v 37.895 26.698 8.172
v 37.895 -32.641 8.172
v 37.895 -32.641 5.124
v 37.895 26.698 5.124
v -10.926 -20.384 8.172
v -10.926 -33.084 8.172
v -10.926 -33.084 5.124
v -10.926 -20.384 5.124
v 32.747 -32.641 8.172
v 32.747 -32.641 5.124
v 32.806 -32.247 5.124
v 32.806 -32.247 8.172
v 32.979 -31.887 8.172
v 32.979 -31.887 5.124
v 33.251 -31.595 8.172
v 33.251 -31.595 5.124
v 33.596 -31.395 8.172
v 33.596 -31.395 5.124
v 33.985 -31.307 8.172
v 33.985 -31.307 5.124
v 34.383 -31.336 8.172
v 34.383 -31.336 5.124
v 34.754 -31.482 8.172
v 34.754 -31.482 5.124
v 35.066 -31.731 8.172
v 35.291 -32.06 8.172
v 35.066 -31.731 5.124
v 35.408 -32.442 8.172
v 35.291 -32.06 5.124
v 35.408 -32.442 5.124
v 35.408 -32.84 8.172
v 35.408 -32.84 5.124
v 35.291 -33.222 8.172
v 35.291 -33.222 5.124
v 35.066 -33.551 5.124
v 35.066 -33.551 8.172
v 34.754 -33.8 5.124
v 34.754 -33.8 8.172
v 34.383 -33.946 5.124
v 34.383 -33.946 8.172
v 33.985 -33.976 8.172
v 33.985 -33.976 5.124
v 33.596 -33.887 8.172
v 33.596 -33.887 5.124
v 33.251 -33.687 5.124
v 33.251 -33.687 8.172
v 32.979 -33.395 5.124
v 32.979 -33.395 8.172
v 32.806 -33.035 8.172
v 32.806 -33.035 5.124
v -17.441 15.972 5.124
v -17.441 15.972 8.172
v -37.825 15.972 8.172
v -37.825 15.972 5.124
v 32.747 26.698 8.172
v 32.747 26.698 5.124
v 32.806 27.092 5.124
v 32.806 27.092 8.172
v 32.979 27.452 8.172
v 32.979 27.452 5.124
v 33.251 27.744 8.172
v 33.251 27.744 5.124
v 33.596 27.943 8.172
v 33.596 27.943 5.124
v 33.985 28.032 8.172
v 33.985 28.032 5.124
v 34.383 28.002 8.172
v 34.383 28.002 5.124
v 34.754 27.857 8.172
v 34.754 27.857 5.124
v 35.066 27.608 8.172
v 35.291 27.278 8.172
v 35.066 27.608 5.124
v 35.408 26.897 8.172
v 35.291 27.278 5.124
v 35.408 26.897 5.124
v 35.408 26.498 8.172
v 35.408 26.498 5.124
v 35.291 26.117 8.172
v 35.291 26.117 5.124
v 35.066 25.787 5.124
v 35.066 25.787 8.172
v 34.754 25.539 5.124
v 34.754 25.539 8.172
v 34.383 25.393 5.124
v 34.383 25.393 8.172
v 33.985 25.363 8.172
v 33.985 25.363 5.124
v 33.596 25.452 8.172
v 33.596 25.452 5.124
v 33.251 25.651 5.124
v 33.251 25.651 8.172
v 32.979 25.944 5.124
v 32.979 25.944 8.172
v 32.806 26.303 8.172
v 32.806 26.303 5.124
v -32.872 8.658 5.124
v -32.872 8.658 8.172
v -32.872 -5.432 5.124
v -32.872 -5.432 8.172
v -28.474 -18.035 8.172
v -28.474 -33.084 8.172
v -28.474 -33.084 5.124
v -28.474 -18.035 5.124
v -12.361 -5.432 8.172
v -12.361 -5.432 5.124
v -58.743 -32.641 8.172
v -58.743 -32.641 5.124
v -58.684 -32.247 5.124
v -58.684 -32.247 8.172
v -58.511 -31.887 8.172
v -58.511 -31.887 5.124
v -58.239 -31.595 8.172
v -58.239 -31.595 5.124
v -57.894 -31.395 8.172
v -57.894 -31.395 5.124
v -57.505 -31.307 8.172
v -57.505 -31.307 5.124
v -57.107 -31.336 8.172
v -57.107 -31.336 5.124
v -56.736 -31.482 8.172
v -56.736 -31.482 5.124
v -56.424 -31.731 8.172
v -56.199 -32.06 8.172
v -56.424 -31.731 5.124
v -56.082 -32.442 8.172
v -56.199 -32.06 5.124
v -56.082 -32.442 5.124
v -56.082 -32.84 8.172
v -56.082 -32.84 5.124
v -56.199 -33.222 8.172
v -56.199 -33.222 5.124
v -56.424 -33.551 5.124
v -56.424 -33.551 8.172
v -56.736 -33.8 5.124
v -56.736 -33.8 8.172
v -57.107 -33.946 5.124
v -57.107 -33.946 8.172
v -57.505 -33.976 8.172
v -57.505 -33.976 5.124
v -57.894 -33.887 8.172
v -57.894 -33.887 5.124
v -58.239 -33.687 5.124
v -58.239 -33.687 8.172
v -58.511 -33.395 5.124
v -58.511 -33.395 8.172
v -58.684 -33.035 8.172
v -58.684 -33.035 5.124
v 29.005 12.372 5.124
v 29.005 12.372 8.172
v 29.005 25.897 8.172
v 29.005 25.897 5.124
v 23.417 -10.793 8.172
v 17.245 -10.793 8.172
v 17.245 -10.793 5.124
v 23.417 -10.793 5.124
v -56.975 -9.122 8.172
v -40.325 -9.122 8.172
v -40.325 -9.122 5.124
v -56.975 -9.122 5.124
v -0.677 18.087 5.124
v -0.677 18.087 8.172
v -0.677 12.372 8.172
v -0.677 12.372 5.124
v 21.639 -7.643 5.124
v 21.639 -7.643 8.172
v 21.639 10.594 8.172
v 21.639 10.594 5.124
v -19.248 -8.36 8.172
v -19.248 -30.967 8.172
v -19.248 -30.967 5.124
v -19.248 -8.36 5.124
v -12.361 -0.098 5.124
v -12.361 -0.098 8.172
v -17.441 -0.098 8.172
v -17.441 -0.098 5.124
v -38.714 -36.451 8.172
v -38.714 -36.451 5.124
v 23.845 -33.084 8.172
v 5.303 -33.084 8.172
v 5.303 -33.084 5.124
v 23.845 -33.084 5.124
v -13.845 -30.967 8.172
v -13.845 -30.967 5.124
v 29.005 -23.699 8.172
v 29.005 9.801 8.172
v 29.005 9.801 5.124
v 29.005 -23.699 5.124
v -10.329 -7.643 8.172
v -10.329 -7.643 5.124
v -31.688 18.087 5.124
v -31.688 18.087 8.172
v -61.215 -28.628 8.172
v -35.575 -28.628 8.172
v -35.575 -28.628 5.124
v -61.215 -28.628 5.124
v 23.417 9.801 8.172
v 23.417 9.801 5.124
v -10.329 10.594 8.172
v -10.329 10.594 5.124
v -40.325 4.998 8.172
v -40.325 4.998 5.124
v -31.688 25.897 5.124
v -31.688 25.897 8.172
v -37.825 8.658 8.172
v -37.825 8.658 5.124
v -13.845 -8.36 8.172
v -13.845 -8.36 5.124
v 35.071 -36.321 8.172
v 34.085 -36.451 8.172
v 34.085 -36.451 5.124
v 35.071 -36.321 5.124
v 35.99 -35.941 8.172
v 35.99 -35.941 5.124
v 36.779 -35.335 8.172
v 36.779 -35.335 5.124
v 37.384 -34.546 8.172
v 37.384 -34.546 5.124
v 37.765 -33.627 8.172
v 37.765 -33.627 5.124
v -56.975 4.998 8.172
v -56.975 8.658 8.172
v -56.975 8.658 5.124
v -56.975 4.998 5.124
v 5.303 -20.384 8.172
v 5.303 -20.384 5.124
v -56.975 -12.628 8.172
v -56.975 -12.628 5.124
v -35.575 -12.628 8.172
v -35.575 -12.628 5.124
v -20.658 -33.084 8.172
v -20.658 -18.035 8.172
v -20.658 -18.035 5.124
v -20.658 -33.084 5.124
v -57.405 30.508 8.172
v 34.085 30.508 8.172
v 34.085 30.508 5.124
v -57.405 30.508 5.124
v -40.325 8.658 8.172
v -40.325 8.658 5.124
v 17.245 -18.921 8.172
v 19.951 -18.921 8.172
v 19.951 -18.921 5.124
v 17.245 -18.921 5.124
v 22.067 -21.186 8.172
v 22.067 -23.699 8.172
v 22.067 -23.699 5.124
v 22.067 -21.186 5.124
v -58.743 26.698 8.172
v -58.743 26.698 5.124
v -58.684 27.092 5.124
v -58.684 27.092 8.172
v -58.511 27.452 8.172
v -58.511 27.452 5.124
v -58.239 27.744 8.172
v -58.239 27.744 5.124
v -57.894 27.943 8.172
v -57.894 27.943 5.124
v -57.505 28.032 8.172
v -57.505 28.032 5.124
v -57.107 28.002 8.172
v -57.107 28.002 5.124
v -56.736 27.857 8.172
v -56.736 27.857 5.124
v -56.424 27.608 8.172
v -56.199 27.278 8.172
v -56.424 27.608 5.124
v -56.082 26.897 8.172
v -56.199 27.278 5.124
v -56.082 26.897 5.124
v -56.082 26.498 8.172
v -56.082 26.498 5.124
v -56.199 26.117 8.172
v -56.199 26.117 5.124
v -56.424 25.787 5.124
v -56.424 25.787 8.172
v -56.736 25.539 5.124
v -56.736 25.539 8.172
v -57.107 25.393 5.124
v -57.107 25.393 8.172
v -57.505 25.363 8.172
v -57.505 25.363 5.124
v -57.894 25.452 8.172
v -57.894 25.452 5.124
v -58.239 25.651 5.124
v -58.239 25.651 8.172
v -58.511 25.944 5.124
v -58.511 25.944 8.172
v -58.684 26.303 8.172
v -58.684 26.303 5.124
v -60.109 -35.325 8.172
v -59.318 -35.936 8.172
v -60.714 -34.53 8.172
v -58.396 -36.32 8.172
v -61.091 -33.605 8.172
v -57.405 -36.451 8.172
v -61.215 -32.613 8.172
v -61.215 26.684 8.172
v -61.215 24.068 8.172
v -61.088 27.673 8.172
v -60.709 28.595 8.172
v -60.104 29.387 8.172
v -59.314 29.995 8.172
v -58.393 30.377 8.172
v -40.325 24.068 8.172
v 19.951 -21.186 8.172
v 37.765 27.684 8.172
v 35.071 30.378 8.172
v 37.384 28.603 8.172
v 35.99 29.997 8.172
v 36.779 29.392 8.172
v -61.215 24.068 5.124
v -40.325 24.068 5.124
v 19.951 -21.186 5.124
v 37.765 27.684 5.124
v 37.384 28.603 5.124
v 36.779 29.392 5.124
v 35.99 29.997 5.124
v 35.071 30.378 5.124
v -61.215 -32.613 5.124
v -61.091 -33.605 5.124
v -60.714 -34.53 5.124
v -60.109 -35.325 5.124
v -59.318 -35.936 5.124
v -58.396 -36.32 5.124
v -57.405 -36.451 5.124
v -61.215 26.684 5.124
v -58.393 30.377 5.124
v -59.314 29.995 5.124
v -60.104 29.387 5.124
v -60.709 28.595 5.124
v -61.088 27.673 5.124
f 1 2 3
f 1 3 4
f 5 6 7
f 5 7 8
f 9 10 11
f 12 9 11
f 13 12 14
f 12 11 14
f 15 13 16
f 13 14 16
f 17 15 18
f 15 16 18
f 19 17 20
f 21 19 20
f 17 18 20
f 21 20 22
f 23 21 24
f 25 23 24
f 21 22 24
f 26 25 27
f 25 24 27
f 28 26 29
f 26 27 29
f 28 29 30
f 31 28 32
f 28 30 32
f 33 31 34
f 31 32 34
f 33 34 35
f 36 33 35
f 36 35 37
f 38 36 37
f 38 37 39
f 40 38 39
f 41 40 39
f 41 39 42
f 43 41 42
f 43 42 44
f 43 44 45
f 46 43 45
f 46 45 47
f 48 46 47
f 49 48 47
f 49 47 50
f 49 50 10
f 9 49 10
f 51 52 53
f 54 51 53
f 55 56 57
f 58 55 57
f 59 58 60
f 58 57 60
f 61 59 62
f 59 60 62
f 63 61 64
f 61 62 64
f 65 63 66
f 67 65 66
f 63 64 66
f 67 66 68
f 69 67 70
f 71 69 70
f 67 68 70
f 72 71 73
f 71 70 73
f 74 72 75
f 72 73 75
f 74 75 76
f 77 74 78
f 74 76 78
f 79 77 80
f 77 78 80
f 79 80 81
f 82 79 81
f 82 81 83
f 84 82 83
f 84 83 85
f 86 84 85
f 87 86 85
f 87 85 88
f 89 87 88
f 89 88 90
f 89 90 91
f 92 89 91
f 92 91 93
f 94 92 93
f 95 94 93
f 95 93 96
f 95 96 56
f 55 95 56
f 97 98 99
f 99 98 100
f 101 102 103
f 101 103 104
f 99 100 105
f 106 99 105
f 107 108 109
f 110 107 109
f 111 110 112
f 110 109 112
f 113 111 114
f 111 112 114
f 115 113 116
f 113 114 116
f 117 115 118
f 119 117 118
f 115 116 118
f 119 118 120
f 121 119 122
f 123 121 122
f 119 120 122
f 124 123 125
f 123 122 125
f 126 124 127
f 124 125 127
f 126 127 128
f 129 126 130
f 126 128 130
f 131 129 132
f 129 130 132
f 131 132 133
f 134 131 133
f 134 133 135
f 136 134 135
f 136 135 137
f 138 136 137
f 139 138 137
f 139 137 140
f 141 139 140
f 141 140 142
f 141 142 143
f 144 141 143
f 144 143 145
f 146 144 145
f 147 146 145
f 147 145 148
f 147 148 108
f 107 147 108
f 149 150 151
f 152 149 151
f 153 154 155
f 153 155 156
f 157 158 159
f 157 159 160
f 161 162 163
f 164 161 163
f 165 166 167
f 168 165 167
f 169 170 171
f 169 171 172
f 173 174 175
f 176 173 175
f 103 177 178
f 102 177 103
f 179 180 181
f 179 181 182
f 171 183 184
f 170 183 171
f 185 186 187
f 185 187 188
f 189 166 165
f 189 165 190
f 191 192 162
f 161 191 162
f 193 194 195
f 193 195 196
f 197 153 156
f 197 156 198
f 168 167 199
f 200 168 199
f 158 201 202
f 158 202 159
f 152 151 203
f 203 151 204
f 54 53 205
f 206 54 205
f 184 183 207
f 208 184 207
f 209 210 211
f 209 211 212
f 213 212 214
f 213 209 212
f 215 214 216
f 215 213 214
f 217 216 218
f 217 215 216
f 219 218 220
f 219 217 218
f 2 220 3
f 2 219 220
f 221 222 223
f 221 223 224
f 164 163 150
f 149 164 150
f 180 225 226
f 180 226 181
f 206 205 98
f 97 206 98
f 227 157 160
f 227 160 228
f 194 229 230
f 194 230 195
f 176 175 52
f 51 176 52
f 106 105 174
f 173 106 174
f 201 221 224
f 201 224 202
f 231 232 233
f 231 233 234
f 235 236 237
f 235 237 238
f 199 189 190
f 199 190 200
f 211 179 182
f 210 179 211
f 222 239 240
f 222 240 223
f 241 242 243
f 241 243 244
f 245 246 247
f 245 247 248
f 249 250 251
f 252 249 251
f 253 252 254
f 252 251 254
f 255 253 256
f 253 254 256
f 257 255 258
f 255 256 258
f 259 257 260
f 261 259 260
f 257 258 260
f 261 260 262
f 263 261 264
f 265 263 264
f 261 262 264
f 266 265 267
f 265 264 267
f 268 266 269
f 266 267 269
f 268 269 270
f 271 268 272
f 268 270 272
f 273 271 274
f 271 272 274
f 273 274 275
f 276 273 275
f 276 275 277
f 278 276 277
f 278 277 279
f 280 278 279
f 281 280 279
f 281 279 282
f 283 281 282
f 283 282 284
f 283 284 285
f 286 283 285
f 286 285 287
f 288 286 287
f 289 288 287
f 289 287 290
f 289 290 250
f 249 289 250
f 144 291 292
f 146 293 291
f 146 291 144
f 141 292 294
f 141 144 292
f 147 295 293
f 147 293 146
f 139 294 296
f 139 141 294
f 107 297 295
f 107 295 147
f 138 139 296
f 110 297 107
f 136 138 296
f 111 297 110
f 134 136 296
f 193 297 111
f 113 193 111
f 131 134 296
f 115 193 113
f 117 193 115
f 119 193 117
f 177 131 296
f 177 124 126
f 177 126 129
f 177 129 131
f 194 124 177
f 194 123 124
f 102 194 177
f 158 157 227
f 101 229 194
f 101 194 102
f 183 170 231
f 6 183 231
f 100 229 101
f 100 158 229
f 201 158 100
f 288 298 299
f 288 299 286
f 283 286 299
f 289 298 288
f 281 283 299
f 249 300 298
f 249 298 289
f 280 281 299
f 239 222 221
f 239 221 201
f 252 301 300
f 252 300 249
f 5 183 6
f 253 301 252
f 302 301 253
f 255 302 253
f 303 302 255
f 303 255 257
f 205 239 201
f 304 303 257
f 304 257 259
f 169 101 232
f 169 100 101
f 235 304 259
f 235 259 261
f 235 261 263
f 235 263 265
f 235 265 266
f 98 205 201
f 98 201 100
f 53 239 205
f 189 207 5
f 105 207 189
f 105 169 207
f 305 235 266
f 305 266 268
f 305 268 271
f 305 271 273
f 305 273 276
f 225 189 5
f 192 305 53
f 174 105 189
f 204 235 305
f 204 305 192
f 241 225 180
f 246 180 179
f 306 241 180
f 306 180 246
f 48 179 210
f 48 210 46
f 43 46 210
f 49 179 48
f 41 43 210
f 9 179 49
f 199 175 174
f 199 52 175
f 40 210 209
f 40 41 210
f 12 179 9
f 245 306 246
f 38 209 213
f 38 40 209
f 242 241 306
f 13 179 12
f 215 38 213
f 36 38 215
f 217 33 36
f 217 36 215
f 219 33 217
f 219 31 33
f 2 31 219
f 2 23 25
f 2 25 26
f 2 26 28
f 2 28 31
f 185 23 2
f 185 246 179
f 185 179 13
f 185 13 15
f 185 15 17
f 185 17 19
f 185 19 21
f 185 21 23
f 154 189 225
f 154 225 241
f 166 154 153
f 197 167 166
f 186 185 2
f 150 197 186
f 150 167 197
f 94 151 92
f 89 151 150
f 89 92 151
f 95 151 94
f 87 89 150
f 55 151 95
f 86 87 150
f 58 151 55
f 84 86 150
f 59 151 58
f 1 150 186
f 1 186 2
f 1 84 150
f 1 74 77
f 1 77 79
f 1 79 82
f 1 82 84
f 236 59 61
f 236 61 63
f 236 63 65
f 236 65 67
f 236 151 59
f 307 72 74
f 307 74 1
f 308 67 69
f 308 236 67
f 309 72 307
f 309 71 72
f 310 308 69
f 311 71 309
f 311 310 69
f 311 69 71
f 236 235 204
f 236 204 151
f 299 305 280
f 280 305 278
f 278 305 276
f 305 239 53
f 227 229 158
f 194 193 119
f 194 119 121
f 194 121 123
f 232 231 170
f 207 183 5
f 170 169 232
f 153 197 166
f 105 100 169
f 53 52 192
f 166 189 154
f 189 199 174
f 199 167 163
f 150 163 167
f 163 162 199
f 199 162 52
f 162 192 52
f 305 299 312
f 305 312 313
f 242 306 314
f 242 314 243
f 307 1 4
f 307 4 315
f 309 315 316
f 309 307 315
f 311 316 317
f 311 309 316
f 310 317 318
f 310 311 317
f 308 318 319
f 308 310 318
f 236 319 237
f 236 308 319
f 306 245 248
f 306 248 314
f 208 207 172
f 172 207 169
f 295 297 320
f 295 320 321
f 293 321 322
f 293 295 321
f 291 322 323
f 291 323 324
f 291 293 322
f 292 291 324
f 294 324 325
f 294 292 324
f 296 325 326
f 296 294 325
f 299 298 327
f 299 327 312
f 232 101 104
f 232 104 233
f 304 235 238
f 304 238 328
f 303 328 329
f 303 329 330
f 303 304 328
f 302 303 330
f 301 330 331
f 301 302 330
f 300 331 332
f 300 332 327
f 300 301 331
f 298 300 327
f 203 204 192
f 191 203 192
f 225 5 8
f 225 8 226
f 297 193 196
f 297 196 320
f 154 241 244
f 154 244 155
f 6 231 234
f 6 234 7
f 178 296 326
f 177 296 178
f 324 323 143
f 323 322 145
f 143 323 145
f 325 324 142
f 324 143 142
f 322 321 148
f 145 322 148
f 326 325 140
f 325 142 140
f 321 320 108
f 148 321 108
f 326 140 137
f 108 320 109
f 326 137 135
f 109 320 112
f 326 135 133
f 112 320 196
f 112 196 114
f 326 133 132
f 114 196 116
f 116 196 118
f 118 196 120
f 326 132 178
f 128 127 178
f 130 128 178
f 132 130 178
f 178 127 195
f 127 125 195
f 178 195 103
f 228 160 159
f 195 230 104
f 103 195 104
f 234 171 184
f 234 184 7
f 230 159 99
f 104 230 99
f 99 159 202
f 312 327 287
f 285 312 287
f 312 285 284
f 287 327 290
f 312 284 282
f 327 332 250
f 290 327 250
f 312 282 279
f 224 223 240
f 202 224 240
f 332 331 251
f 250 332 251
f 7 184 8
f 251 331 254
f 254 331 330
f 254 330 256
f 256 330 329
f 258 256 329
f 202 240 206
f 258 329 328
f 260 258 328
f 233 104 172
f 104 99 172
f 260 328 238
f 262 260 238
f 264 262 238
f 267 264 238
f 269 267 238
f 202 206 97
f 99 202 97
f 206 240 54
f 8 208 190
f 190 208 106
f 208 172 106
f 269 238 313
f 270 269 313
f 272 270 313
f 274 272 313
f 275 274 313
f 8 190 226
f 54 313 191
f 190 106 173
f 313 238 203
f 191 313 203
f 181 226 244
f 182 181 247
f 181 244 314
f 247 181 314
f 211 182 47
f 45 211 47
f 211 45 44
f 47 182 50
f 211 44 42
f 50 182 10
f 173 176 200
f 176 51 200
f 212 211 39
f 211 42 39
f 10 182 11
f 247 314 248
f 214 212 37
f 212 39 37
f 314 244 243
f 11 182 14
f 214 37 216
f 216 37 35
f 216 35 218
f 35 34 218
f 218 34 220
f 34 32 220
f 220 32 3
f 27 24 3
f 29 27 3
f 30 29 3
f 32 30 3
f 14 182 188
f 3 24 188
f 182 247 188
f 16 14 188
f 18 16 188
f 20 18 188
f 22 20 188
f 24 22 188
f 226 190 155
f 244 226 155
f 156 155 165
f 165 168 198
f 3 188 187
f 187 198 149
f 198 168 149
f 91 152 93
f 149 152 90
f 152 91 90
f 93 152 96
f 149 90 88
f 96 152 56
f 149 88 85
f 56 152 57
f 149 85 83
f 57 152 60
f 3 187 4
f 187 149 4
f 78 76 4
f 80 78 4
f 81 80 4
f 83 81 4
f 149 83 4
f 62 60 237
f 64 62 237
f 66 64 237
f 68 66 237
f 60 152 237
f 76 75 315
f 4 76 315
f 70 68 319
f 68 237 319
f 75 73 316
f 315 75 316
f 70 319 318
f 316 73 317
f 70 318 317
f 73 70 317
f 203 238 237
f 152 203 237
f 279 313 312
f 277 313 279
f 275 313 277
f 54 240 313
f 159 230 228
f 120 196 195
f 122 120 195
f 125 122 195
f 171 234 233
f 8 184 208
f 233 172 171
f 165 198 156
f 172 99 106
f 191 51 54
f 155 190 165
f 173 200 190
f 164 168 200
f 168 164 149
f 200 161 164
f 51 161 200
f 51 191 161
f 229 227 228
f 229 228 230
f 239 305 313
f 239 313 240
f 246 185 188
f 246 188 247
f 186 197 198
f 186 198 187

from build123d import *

# Parameters (mm, degrees)
SKETCH2_W           = 5.4034
SKETCH2_H           = 22.6066
SKETCH2_W_2         = 31.9679
SKETCH2_H_2         = 18.2371
BOSS_EXTRUDE1_DEPTH = 3.048
SKETCH3_R           = 1.338245378
CUT_EXTRUDE1_DEPTH  = 72.310891511


with BuildPart() as part:
    # Sketch2 → Boss-Extrude1 (new body)
    with BuildSketch(Plane(origin=(0, 0, 8.171752382), x_dir=(-1, 0, 0), z_dir=(0, 0, -1))):
        with BuildLine():
            Line((-23.844892625, -33.084405696), (-34.084892625, -36.451005696))
            ThreePointArc((-34.084892625, -36.451005696), (-36.778969461, -35.335082532), (-37.894892625, -32.641005696))
            Line((-37.894892625, -32.641005696), (-37.894892625, 26.697694304))
            ThreePointArc((-37.894892625, 26.697694304), (-36.778969461, 29.391771141), (-34.084892625, 30.507694304))
            Line((-34.084892625, 30.507694304), (57.404932375, 30.507694304))
            ThreePointArc((57.404932375, 30.507694304), (60.103884597, 29.386886916), (61.214907375, 26.683892153))
            Line((61.214907375, 26.683892153), (61.214907375, 24.068294304))
            Line((61.214907375, 24.068294304), (40.325007375, 24.068294304))
            Line((40.325007375, 24.068294304), (40.325007375, 8.658194304))
            Line((40.325007375, 8.658194304), (56.975007375, 8.658194304))
            Line((56.975007375, 8.658194304), (56.975007375, 4.997894304))
            Line((56.975007375, 4.997894304), (40.325007375, 4.997894304))
            Line((40.325007375, 4.997894304), (40.325007375, -9.121805696))
            Line((40.325007375, -9.121805696), (56.975007375, -9.121805696))
            Line((56.975007375, -9.121805696), (56.975007375, -12.628005696))
            Line((56.975007375, -12.628005696), (35.575007375, -12.628005696))
            Line((35.575007375, -12.628005696), (35.575007375, -28.627805696))
            Line((35.575007375, -28.627805696), (61.214907375, -28.627805696))
            Line((61.214907375, -28.627805696), (61.214907375, -32.613401529))
            ThreePointArc((61.214907375, -32.613401529), (60.108826144, -35.325305244), (57.405007375, -36.451005696))
            Line((57.405007375, -36.451005696), (38.714307375, -36.451005696))
            Line((38.714307375, -36.451005696), (28.474307375, -33.084405696))
            Line((28.474307375, -33.084405696), (28.474307375, -18.034905696))
            Line((28.474307375, -18.034905696), (20.658107375, -18.034905696))
            Line((20.658107375, -18.034905696), (20.658107375, -33.084405696))
            Line((20.658107375, -33.084405696), (10.926407375, -33.084405696))
            Line((10.926407375, -33.084405696), (10.926407375, -20.384405696))
            Line((10.926407375, -20.384405696), (-5.302892625, -20.384405696))
            Line((-5.302892625, -20.384405696), (-5.302892625, -33.084405696))
            Line((-5.302892625, -33.084405696), (-23.844892625, -33.084405696))
        make_face()
        with Locations((16.546707375, -19.663505696)):
            Rectangle(SKETCH2_W, SKETCH2_H, mode=Mode.SUBTRACT)
        Polygon((-29.004892625, -23.698905696), (-22.066892625, -23.698905696), (-22.066892625, -21.185805696), (-19.950892625, -21.185805696), (-19.950892625, -18.920605696), (-17.244692625, -18.920605696), (-17.244692625, -10.792605696), (-23.416892625, -10.792605696), (-23.416892625, 9.801194304), (-29.004892625, 9.801194304), align=None, mode=Mode.SUBTRACT)
        with Locations((-5.654942625, 1.475544304)):
            Rectangle(SKETCH2_W_2, SKETCH2_H_2, mode=Mode.SUBTRACT)
        Polygon((12.361007375, -0.097605696), (17.441007375, -0.097605696), (17.441007375, 15.972394304), (37.825007375, 15.972394304), (37.825007375, 8.658194304), (32.872007375, 8.658194304), (32.872007375, -5.431505696), (12.361007375, -5.431505696), align=None, mode=Mode.SUBTRACT)
        Polygon((0.677107375, 12.372094304), (-29.004794688, 12.372094304), (-29.004892625, 25.896994304), (31.688307375, 25.896994304), (31.688307375, 18.086994304), (0.677107375, 18.086994304), align=None, mode=Mode.SUBTRACT)
    extrude(amount=BOSS_EXTRUDE1_DEPTH)

    # Sketch3 → Cut-Extrude1 (cut, through all)
    with BuildSketch(Plane(origin=(0, 0, 5.123752382), x_dir=(-1, 0, 0), z_dir=(0, 0, -1))):
        with Locations((57.405007375, -32.641005696)):
            Circle(SKETCH3_R)
        with Locations((-34.084892625, -32.641005696)):
            Circle(SKETCH3_R)
        with Locations((-34.084892625, 26.697694304)):
            Circle(SKETCH3_R)
        with Locations((57.404932375, 26.697694304)):
            Circle(SKETCH3_R)
    extrude(amount=-CUT_EXTRUDE1_DEPTH, mode=Mode.SUBTRACT)


solid = part.part
